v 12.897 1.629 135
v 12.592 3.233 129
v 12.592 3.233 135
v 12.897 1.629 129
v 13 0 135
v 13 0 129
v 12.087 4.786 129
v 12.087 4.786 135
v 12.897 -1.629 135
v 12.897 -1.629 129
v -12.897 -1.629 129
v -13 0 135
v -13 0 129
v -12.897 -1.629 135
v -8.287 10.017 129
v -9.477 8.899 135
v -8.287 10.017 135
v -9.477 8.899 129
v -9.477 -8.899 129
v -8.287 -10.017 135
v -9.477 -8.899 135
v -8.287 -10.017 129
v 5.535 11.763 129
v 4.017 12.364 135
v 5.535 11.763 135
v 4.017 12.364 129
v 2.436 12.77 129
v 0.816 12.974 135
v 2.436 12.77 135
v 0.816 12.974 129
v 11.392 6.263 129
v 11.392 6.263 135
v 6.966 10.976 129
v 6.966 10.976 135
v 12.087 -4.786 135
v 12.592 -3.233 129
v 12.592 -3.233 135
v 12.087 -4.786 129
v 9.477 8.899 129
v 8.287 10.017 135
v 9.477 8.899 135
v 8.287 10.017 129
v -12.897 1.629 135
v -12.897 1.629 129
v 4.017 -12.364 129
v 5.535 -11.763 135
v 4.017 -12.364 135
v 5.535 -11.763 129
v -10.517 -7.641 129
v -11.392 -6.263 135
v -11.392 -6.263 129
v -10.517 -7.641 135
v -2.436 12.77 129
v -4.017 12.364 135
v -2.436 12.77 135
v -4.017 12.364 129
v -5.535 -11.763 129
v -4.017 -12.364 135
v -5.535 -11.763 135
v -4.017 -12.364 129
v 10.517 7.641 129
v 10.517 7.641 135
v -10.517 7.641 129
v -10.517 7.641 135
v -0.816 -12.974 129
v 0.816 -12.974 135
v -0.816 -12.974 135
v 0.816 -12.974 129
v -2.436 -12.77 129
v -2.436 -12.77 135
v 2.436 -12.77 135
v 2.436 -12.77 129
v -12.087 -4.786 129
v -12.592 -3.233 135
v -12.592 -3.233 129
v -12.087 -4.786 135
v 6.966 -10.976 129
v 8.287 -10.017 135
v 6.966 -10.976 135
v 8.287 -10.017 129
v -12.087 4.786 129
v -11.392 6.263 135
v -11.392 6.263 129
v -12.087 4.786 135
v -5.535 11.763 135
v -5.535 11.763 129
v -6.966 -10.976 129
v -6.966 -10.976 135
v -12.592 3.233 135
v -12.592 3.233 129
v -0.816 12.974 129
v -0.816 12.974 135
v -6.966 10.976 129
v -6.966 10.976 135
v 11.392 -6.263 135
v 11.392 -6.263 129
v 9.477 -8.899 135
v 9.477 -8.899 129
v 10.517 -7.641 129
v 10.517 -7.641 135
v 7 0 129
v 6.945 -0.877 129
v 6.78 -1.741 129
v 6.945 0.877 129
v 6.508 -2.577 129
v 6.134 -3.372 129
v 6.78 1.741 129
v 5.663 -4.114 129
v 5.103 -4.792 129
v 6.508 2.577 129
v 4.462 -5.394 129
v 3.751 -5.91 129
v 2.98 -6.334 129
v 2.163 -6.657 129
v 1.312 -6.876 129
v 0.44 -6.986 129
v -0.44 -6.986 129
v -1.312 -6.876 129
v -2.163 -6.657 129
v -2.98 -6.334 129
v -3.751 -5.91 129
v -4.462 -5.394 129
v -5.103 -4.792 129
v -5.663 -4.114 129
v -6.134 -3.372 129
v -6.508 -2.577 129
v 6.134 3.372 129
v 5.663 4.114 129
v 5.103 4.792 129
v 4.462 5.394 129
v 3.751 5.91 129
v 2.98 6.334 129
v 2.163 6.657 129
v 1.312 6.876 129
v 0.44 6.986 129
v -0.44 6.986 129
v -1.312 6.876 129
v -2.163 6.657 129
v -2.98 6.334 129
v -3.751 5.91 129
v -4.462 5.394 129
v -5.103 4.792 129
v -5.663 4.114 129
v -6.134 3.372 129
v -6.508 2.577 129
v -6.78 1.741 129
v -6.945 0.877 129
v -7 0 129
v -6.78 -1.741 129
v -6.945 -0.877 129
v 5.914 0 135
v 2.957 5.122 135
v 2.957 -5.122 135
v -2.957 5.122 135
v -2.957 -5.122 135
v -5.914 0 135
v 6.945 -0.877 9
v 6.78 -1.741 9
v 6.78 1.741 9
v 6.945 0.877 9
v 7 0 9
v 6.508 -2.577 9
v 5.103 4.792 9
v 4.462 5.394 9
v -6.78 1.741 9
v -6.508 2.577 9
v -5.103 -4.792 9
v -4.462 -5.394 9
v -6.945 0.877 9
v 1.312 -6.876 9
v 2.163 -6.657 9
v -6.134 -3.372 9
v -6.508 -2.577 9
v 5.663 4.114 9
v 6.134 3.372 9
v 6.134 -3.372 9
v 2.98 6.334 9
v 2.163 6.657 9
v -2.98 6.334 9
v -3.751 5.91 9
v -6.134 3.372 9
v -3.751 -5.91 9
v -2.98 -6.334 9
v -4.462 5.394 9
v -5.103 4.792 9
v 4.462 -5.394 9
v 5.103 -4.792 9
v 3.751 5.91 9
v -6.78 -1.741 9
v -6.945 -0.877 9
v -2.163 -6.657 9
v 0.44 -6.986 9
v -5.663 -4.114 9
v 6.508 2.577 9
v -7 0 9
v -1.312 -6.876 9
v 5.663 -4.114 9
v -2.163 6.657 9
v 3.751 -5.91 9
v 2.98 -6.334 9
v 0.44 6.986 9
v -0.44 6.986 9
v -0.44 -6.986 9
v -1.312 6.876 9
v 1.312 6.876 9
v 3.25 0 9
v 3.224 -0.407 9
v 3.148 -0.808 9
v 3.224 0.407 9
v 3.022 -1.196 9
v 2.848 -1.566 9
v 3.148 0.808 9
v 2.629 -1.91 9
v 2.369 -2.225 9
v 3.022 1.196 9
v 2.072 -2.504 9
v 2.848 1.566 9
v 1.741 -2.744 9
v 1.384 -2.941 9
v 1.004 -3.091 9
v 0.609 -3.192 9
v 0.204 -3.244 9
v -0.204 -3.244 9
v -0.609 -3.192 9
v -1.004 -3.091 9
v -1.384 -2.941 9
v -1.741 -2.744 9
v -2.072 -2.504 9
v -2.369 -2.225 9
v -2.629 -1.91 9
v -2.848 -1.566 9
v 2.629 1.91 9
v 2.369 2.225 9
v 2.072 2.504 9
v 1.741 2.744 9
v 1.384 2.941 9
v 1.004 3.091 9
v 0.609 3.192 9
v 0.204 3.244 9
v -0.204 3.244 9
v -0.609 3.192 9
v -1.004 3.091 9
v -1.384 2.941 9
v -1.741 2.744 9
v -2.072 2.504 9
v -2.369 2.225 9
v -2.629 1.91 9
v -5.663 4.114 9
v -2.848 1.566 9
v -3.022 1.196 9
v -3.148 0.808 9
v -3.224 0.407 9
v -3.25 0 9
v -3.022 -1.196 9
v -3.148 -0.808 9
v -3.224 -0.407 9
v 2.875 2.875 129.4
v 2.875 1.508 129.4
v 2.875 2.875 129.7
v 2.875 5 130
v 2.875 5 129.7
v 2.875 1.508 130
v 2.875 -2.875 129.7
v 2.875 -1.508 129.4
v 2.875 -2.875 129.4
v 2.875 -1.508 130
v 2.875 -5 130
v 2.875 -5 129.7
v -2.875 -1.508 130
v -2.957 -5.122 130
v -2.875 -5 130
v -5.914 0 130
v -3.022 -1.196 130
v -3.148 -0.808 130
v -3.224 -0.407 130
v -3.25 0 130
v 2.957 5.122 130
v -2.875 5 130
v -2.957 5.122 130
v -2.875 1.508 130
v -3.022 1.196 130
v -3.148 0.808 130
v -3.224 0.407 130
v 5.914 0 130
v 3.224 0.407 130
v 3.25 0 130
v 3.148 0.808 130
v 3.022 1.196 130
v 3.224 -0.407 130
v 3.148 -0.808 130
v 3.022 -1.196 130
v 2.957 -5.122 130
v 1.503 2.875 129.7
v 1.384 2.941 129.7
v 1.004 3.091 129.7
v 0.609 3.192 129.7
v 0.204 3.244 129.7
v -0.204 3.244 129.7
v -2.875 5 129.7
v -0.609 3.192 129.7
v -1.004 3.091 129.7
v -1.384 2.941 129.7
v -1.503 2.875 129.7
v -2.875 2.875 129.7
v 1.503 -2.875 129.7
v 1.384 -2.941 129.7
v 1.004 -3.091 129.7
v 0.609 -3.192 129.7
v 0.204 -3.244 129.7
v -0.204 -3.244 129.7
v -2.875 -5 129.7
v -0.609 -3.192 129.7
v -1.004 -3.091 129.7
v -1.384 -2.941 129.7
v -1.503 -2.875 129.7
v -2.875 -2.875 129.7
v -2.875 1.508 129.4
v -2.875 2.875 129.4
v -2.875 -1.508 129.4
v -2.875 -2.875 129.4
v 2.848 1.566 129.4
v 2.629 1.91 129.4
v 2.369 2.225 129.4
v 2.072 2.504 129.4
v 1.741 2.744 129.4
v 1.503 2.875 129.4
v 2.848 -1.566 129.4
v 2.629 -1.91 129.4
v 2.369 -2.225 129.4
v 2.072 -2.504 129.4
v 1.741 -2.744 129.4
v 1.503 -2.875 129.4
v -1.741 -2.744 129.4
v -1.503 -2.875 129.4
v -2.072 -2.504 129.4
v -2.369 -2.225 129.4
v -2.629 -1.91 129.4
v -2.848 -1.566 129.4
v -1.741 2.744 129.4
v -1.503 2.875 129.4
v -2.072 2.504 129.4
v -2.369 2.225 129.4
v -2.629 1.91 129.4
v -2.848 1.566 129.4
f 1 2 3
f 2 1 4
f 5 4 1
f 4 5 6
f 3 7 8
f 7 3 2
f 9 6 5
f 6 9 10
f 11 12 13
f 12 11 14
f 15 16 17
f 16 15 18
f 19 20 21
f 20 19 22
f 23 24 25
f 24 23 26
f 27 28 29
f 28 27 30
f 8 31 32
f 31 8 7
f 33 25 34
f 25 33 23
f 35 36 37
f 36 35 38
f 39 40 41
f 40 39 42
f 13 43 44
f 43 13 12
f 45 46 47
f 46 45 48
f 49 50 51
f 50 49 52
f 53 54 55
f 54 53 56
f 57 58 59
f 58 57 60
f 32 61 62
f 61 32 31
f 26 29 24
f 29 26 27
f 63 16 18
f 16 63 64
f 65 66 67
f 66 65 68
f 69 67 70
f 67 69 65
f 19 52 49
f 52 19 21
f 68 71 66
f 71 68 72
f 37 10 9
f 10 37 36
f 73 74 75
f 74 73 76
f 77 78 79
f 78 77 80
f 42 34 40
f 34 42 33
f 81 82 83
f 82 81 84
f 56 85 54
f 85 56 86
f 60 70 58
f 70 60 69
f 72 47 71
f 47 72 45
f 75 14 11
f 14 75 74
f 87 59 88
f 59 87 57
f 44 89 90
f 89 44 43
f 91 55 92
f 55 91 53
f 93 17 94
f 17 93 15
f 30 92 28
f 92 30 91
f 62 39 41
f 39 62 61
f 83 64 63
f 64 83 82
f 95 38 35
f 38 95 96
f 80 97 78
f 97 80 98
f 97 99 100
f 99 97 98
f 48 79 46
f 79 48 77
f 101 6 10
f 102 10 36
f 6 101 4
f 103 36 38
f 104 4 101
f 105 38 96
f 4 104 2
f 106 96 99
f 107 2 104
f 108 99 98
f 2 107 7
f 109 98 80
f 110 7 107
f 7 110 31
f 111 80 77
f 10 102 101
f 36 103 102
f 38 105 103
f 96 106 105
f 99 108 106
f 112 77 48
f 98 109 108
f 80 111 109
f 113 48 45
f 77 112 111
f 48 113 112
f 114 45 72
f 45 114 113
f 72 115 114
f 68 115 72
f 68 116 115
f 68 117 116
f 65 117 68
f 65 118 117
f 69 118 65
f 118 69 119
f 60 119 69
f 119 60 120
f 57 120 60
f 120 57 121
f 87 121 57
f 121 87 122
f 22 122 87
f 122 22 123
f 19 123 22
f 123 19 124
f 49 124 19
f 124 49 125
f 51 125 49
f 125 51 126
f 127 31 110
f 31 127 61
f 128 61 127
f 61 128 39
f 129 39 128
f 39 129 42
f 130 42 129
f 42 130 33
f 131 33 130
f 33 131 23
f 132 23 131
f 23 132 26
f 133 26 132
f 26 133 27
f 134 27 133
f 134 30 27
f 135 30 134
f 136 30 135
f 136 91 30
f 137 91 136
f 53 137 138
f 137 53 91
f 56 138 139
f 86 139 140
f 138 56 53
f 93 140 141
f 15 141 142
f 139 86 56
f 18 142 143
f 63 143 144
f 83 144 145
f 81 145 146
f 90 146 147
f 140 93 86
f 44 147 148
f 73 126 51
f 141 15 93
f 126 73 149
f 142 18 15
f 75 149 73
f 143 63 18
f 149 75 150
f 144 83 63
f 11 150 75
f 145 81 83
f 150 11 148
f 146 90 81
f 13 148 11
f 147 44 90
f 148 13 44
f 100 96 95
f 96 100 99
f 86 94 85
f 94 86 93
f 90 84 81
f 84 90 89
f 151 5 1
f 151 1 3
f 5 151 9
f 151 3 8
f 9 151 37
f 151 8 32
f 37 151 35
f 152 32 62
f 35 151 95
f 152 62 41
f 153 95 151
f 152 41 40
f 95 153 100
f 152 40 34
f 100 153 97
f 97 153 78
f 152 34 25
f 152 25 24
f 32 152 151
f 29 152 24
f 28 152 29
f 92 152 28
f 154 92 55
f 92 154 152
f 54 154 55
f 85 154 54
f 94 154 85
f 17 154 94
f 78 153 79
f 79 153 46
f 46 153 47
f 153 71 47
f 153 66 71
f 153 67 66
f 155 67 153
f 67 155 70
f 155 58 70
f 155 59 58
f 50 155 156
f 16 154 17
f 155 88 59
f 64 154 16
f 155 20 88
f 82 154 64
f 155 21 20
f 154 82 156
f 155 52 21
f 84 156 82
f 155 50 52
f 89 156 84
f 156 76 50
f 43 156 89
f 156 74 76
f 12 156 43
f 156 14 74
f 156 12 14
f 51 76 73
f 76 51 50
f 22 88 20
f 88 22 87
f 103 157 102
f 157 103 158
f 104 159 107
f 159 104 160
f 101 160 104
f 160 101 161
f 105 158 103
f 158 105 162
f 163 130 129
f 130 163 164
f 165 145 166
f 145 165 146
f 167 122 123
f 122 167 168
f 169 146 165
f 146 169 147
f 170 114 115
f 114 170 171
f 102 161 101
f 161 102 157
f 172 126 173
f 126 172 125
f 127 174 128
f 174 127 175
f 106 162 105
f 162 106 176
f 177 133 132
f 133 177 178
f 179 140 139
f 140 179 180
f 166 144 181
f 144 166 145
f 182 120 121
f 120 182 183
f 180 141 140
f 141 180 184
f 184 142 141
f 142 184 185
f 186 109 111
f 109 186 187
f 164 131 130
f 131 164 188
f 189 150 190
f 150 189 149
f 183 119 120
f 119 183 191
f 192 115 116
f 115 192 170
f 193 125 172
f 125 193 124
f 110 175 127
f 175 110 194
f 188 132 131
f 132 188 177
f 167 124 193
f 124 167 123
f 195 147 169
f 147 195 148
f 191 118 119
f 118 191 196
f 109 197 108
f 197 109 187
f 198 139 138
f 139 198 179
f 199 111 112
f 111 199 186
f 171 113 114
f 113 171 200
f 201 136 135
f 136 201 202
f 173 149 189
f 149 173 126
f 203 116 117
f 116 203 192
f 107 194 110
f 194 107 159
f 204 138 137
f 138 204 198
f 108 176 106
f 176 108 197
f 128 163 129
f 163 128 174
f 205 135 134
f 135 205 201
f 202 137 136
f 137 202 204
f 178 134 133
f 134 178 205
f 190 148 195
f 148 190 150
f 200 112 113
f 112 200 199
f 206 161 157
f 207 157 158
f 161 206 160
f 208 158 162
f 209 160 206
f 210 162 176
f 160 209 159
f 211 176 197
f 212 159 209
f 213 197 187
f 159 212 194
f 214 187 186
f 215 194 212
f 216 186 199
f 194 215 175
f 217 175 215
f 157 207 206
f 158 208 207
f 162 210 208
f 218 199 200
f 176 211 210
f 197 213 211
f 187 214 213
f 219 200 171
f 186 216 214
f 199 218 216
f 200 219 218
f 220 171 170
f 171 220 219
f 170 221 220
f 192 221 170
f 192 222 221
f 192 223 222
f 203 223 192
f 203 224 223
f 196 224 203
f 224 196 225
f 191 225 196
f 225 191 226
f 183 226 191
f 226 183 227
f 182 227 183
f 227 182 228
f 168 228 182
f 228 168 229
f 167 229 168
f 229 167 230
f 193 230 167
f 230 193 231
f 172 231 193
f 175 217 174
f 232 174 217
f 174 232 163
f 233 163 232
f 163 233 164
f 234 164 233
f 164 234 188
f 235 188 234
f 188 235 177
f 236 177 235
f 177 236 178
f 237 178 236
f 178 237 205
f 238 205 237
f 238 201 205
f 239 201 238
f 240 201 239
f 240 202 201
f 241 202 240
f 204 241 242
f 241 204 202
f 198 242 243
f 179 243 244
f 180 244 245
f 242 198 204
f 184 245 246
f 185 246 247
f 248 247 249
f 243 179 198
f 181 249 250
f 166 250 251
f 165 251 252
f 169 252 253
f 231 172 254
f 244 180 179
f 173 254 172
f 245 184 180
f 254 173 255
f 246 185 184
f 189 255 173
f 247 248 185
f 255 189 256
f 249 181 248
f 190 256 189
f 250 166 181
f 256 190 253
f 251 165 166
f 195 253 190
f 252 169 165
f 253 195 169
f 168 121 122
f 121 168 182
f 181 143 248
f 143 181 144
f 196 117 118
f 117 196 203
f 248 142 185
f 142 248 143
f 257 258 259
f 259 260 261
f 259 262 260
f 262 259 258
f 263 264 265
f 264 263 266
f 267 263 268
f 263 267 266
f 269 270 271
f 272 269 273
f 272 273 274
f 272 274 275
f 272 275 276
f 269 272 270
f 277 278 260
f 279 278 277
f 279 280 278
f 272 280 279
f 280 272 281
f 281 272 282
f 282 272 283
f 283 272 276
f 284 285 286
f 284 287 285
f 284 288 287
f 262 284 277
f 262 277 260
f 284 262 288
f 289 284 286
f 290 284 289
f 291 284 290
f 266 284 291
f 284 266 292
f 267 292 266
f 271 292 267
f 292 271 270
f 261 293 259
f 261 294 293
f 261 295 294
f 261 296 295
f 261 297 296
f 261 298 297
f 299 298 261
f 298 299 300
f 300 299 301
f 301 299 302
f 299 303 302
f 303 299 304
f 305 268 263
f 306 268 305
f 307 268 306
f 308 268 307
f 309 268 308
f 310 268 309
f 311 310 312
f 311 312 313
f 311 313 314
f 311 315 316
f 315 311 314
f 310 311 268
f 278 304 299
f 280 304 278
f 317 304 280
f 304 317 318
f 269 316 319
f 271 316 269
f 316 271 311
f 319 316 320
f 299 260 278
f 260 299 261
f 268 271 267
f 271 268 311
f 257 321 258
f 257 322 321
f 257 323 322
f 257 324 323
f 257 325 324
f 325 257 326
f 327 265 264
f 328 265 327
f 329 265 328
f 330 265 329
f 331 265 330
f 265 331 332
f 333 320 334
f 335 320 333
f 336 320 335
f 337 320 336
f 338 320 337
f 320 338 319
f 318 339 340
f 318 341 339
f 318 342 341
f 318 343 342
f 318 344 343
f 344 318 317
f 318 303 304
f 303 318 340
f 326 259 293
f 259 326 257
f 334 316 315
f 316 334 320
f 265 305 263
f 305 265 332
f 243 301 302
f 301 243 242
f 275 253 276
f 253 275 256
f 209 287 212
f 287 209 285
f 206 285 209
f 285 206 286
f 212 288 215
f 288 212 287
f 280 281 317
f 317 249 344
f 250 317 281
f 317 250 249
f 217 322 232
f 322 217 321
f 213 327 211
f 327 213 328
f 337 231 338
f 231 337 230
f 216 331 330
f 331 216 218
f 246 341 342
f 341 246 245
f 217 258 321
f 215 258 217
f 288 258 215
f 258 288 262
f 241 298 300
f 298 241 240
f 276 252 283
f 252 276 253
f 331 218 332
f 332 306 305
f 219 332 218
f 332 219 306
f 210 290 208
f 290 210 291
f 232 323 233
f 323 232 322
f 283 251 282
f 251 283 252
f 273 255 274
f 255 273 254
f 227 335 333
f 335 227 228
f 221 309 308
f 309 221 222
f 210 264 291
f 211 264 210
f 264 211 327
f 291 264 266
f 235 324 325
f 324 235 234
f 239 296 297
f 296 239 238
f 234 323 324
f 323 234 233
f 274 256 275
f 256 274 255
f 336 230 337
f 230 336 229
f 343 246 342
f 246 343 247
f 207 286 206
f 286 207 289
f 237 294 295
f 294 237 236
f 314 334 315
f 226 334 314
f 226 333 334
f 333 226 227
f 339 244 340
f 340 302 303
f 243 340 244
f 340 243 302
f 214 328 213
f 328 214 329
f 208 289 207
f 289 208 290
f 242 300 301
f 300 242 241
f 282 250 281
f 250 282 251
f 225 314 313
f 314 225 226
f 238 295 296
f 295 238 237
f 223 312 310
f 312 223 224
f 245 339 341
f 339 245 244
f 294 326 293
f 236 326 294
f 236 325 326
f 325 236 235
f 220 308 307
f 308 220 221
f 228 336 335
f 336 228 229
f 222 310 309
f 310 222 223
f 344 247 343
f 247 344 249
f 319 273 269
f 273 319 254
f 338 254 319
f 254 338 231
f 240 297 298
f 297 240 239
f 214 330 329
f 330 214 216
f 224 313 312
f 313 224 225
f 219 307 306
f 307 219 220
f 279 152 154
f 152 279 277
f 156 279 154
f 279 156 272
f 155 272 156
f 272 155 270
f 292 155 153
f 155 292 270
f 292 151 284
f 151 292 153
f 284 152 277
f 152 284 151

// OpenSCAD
$fn = 50;


difference() {
	union() {
		translate(v = [0, 0, 129.0000000000]) {
			cylinder(h = 6, r = 13.0000000000);
		}
		translate(v = [0, 0, 9.0000000000]) {
			cylinder(h = 126, r = 7.0000000000);
		}
	}
	union() {
		translate(v = [0, 0, 135]) {
			rotate(a = [0, 0, 0]) {
				difference() {
					union() {
						#translate(v = [-2.8750000000, -5.0000000000, -5.3000000000]) {
							cube(size = [5.7500000000, 10, 0.3000000000]);
						}
						#translate(v = [-2.8750000000, -2.8750000000, -5.6000000000]) {
							cube(size = [5.7500000000, 5.7500000000, 0.3000000000]);
						}
						#translate(v = [-2.8750000000, -5.0000000000, 0]) {
							cube(size = [5.7500000000, 10, 0.3000000000]);
						}
						#translate(v = [-2.8750000000, -2.8750000000, 0.3000000000]) {
							cube(size = [5.7500000000, 5.7500000000, 0.3000000000]);
						}
						#translate(v = [0, 0, -100.0000000000]) {
							cylinder(h = 200, r = 3.2500000000);
						}
						translate(v = [0, 0, -5]) {
							#linear_extrude(height = 5) {
								polygon(points = [[5.9142500000, 0.0000000000], [2.9571250000, 5.1218907443], [-2.9571250000, 5.1218907443], [-5.9142500000, 0.0000000000], [-2.9571250000, -5.1218907443], [2.9571250000, -5.1218907443]]);
							}
						}
						#translate(v = [-2.8750000000, -5.0000000000, -5.3000000000]) {
							cube(size = [5.7500000000, 10, 0.3000000000]);
						}
						#translate(v = [-2.8750000000, -2.8750000000, -5.6000000000]) {
							cube(size = [5.7500000000, 5.7500000000, 0.3000000000]);
						}
						#translate(v = [-2.8750000000, -5.0000000000, 0]) {
							cube(size = [5.7500000000, 10, 0.3000000000]);
						}
						#translate(v = [-2.8750000000, -2.8750000000, 0.3000000000]) {
							cube(size = [5.7500000000, 5.7500000000, 0.3000000000]);
						}
						#translate(v = [0, 0, -100.0000000000]) {
							cylinder(h = 200, r = 3.2500000000);
						}
						#translate(v = [-2.8750000000, -5.0000000000, -5.3000000000]) {
							cube(size = [5.7500000000, 10, 0.3000000000]);
						}
						#translate(v = [-2.8750000000, -2.8750000000, -5.6000000000]) {
							cube(size = [5.7500000000, 5.7500000000, 0.3000000000]);
						}
						#translate(v = [-2.8750000000, -5.0000000000, 0]) {
							cube(size = [5.7500000000, 10, 0.3000000000]);
						}
						#translate(v = [-2.8750000000, -2.8750000000, 0.3000000000]) {
							cube(size = [5.7500000000, 5.7500000000, 0.3000000000]);
						}
						#translate(v = [0, 0, -100.0000000000]) {
							cylinder(h = 200, r = 3.2500000000);
						}
					}
					union();
				}
			}
		}
		#translate(v = [0, 0, -100.0000000000]) {
			cylinder(h = 200, r = 3.2500000000);
		}
	}
}
